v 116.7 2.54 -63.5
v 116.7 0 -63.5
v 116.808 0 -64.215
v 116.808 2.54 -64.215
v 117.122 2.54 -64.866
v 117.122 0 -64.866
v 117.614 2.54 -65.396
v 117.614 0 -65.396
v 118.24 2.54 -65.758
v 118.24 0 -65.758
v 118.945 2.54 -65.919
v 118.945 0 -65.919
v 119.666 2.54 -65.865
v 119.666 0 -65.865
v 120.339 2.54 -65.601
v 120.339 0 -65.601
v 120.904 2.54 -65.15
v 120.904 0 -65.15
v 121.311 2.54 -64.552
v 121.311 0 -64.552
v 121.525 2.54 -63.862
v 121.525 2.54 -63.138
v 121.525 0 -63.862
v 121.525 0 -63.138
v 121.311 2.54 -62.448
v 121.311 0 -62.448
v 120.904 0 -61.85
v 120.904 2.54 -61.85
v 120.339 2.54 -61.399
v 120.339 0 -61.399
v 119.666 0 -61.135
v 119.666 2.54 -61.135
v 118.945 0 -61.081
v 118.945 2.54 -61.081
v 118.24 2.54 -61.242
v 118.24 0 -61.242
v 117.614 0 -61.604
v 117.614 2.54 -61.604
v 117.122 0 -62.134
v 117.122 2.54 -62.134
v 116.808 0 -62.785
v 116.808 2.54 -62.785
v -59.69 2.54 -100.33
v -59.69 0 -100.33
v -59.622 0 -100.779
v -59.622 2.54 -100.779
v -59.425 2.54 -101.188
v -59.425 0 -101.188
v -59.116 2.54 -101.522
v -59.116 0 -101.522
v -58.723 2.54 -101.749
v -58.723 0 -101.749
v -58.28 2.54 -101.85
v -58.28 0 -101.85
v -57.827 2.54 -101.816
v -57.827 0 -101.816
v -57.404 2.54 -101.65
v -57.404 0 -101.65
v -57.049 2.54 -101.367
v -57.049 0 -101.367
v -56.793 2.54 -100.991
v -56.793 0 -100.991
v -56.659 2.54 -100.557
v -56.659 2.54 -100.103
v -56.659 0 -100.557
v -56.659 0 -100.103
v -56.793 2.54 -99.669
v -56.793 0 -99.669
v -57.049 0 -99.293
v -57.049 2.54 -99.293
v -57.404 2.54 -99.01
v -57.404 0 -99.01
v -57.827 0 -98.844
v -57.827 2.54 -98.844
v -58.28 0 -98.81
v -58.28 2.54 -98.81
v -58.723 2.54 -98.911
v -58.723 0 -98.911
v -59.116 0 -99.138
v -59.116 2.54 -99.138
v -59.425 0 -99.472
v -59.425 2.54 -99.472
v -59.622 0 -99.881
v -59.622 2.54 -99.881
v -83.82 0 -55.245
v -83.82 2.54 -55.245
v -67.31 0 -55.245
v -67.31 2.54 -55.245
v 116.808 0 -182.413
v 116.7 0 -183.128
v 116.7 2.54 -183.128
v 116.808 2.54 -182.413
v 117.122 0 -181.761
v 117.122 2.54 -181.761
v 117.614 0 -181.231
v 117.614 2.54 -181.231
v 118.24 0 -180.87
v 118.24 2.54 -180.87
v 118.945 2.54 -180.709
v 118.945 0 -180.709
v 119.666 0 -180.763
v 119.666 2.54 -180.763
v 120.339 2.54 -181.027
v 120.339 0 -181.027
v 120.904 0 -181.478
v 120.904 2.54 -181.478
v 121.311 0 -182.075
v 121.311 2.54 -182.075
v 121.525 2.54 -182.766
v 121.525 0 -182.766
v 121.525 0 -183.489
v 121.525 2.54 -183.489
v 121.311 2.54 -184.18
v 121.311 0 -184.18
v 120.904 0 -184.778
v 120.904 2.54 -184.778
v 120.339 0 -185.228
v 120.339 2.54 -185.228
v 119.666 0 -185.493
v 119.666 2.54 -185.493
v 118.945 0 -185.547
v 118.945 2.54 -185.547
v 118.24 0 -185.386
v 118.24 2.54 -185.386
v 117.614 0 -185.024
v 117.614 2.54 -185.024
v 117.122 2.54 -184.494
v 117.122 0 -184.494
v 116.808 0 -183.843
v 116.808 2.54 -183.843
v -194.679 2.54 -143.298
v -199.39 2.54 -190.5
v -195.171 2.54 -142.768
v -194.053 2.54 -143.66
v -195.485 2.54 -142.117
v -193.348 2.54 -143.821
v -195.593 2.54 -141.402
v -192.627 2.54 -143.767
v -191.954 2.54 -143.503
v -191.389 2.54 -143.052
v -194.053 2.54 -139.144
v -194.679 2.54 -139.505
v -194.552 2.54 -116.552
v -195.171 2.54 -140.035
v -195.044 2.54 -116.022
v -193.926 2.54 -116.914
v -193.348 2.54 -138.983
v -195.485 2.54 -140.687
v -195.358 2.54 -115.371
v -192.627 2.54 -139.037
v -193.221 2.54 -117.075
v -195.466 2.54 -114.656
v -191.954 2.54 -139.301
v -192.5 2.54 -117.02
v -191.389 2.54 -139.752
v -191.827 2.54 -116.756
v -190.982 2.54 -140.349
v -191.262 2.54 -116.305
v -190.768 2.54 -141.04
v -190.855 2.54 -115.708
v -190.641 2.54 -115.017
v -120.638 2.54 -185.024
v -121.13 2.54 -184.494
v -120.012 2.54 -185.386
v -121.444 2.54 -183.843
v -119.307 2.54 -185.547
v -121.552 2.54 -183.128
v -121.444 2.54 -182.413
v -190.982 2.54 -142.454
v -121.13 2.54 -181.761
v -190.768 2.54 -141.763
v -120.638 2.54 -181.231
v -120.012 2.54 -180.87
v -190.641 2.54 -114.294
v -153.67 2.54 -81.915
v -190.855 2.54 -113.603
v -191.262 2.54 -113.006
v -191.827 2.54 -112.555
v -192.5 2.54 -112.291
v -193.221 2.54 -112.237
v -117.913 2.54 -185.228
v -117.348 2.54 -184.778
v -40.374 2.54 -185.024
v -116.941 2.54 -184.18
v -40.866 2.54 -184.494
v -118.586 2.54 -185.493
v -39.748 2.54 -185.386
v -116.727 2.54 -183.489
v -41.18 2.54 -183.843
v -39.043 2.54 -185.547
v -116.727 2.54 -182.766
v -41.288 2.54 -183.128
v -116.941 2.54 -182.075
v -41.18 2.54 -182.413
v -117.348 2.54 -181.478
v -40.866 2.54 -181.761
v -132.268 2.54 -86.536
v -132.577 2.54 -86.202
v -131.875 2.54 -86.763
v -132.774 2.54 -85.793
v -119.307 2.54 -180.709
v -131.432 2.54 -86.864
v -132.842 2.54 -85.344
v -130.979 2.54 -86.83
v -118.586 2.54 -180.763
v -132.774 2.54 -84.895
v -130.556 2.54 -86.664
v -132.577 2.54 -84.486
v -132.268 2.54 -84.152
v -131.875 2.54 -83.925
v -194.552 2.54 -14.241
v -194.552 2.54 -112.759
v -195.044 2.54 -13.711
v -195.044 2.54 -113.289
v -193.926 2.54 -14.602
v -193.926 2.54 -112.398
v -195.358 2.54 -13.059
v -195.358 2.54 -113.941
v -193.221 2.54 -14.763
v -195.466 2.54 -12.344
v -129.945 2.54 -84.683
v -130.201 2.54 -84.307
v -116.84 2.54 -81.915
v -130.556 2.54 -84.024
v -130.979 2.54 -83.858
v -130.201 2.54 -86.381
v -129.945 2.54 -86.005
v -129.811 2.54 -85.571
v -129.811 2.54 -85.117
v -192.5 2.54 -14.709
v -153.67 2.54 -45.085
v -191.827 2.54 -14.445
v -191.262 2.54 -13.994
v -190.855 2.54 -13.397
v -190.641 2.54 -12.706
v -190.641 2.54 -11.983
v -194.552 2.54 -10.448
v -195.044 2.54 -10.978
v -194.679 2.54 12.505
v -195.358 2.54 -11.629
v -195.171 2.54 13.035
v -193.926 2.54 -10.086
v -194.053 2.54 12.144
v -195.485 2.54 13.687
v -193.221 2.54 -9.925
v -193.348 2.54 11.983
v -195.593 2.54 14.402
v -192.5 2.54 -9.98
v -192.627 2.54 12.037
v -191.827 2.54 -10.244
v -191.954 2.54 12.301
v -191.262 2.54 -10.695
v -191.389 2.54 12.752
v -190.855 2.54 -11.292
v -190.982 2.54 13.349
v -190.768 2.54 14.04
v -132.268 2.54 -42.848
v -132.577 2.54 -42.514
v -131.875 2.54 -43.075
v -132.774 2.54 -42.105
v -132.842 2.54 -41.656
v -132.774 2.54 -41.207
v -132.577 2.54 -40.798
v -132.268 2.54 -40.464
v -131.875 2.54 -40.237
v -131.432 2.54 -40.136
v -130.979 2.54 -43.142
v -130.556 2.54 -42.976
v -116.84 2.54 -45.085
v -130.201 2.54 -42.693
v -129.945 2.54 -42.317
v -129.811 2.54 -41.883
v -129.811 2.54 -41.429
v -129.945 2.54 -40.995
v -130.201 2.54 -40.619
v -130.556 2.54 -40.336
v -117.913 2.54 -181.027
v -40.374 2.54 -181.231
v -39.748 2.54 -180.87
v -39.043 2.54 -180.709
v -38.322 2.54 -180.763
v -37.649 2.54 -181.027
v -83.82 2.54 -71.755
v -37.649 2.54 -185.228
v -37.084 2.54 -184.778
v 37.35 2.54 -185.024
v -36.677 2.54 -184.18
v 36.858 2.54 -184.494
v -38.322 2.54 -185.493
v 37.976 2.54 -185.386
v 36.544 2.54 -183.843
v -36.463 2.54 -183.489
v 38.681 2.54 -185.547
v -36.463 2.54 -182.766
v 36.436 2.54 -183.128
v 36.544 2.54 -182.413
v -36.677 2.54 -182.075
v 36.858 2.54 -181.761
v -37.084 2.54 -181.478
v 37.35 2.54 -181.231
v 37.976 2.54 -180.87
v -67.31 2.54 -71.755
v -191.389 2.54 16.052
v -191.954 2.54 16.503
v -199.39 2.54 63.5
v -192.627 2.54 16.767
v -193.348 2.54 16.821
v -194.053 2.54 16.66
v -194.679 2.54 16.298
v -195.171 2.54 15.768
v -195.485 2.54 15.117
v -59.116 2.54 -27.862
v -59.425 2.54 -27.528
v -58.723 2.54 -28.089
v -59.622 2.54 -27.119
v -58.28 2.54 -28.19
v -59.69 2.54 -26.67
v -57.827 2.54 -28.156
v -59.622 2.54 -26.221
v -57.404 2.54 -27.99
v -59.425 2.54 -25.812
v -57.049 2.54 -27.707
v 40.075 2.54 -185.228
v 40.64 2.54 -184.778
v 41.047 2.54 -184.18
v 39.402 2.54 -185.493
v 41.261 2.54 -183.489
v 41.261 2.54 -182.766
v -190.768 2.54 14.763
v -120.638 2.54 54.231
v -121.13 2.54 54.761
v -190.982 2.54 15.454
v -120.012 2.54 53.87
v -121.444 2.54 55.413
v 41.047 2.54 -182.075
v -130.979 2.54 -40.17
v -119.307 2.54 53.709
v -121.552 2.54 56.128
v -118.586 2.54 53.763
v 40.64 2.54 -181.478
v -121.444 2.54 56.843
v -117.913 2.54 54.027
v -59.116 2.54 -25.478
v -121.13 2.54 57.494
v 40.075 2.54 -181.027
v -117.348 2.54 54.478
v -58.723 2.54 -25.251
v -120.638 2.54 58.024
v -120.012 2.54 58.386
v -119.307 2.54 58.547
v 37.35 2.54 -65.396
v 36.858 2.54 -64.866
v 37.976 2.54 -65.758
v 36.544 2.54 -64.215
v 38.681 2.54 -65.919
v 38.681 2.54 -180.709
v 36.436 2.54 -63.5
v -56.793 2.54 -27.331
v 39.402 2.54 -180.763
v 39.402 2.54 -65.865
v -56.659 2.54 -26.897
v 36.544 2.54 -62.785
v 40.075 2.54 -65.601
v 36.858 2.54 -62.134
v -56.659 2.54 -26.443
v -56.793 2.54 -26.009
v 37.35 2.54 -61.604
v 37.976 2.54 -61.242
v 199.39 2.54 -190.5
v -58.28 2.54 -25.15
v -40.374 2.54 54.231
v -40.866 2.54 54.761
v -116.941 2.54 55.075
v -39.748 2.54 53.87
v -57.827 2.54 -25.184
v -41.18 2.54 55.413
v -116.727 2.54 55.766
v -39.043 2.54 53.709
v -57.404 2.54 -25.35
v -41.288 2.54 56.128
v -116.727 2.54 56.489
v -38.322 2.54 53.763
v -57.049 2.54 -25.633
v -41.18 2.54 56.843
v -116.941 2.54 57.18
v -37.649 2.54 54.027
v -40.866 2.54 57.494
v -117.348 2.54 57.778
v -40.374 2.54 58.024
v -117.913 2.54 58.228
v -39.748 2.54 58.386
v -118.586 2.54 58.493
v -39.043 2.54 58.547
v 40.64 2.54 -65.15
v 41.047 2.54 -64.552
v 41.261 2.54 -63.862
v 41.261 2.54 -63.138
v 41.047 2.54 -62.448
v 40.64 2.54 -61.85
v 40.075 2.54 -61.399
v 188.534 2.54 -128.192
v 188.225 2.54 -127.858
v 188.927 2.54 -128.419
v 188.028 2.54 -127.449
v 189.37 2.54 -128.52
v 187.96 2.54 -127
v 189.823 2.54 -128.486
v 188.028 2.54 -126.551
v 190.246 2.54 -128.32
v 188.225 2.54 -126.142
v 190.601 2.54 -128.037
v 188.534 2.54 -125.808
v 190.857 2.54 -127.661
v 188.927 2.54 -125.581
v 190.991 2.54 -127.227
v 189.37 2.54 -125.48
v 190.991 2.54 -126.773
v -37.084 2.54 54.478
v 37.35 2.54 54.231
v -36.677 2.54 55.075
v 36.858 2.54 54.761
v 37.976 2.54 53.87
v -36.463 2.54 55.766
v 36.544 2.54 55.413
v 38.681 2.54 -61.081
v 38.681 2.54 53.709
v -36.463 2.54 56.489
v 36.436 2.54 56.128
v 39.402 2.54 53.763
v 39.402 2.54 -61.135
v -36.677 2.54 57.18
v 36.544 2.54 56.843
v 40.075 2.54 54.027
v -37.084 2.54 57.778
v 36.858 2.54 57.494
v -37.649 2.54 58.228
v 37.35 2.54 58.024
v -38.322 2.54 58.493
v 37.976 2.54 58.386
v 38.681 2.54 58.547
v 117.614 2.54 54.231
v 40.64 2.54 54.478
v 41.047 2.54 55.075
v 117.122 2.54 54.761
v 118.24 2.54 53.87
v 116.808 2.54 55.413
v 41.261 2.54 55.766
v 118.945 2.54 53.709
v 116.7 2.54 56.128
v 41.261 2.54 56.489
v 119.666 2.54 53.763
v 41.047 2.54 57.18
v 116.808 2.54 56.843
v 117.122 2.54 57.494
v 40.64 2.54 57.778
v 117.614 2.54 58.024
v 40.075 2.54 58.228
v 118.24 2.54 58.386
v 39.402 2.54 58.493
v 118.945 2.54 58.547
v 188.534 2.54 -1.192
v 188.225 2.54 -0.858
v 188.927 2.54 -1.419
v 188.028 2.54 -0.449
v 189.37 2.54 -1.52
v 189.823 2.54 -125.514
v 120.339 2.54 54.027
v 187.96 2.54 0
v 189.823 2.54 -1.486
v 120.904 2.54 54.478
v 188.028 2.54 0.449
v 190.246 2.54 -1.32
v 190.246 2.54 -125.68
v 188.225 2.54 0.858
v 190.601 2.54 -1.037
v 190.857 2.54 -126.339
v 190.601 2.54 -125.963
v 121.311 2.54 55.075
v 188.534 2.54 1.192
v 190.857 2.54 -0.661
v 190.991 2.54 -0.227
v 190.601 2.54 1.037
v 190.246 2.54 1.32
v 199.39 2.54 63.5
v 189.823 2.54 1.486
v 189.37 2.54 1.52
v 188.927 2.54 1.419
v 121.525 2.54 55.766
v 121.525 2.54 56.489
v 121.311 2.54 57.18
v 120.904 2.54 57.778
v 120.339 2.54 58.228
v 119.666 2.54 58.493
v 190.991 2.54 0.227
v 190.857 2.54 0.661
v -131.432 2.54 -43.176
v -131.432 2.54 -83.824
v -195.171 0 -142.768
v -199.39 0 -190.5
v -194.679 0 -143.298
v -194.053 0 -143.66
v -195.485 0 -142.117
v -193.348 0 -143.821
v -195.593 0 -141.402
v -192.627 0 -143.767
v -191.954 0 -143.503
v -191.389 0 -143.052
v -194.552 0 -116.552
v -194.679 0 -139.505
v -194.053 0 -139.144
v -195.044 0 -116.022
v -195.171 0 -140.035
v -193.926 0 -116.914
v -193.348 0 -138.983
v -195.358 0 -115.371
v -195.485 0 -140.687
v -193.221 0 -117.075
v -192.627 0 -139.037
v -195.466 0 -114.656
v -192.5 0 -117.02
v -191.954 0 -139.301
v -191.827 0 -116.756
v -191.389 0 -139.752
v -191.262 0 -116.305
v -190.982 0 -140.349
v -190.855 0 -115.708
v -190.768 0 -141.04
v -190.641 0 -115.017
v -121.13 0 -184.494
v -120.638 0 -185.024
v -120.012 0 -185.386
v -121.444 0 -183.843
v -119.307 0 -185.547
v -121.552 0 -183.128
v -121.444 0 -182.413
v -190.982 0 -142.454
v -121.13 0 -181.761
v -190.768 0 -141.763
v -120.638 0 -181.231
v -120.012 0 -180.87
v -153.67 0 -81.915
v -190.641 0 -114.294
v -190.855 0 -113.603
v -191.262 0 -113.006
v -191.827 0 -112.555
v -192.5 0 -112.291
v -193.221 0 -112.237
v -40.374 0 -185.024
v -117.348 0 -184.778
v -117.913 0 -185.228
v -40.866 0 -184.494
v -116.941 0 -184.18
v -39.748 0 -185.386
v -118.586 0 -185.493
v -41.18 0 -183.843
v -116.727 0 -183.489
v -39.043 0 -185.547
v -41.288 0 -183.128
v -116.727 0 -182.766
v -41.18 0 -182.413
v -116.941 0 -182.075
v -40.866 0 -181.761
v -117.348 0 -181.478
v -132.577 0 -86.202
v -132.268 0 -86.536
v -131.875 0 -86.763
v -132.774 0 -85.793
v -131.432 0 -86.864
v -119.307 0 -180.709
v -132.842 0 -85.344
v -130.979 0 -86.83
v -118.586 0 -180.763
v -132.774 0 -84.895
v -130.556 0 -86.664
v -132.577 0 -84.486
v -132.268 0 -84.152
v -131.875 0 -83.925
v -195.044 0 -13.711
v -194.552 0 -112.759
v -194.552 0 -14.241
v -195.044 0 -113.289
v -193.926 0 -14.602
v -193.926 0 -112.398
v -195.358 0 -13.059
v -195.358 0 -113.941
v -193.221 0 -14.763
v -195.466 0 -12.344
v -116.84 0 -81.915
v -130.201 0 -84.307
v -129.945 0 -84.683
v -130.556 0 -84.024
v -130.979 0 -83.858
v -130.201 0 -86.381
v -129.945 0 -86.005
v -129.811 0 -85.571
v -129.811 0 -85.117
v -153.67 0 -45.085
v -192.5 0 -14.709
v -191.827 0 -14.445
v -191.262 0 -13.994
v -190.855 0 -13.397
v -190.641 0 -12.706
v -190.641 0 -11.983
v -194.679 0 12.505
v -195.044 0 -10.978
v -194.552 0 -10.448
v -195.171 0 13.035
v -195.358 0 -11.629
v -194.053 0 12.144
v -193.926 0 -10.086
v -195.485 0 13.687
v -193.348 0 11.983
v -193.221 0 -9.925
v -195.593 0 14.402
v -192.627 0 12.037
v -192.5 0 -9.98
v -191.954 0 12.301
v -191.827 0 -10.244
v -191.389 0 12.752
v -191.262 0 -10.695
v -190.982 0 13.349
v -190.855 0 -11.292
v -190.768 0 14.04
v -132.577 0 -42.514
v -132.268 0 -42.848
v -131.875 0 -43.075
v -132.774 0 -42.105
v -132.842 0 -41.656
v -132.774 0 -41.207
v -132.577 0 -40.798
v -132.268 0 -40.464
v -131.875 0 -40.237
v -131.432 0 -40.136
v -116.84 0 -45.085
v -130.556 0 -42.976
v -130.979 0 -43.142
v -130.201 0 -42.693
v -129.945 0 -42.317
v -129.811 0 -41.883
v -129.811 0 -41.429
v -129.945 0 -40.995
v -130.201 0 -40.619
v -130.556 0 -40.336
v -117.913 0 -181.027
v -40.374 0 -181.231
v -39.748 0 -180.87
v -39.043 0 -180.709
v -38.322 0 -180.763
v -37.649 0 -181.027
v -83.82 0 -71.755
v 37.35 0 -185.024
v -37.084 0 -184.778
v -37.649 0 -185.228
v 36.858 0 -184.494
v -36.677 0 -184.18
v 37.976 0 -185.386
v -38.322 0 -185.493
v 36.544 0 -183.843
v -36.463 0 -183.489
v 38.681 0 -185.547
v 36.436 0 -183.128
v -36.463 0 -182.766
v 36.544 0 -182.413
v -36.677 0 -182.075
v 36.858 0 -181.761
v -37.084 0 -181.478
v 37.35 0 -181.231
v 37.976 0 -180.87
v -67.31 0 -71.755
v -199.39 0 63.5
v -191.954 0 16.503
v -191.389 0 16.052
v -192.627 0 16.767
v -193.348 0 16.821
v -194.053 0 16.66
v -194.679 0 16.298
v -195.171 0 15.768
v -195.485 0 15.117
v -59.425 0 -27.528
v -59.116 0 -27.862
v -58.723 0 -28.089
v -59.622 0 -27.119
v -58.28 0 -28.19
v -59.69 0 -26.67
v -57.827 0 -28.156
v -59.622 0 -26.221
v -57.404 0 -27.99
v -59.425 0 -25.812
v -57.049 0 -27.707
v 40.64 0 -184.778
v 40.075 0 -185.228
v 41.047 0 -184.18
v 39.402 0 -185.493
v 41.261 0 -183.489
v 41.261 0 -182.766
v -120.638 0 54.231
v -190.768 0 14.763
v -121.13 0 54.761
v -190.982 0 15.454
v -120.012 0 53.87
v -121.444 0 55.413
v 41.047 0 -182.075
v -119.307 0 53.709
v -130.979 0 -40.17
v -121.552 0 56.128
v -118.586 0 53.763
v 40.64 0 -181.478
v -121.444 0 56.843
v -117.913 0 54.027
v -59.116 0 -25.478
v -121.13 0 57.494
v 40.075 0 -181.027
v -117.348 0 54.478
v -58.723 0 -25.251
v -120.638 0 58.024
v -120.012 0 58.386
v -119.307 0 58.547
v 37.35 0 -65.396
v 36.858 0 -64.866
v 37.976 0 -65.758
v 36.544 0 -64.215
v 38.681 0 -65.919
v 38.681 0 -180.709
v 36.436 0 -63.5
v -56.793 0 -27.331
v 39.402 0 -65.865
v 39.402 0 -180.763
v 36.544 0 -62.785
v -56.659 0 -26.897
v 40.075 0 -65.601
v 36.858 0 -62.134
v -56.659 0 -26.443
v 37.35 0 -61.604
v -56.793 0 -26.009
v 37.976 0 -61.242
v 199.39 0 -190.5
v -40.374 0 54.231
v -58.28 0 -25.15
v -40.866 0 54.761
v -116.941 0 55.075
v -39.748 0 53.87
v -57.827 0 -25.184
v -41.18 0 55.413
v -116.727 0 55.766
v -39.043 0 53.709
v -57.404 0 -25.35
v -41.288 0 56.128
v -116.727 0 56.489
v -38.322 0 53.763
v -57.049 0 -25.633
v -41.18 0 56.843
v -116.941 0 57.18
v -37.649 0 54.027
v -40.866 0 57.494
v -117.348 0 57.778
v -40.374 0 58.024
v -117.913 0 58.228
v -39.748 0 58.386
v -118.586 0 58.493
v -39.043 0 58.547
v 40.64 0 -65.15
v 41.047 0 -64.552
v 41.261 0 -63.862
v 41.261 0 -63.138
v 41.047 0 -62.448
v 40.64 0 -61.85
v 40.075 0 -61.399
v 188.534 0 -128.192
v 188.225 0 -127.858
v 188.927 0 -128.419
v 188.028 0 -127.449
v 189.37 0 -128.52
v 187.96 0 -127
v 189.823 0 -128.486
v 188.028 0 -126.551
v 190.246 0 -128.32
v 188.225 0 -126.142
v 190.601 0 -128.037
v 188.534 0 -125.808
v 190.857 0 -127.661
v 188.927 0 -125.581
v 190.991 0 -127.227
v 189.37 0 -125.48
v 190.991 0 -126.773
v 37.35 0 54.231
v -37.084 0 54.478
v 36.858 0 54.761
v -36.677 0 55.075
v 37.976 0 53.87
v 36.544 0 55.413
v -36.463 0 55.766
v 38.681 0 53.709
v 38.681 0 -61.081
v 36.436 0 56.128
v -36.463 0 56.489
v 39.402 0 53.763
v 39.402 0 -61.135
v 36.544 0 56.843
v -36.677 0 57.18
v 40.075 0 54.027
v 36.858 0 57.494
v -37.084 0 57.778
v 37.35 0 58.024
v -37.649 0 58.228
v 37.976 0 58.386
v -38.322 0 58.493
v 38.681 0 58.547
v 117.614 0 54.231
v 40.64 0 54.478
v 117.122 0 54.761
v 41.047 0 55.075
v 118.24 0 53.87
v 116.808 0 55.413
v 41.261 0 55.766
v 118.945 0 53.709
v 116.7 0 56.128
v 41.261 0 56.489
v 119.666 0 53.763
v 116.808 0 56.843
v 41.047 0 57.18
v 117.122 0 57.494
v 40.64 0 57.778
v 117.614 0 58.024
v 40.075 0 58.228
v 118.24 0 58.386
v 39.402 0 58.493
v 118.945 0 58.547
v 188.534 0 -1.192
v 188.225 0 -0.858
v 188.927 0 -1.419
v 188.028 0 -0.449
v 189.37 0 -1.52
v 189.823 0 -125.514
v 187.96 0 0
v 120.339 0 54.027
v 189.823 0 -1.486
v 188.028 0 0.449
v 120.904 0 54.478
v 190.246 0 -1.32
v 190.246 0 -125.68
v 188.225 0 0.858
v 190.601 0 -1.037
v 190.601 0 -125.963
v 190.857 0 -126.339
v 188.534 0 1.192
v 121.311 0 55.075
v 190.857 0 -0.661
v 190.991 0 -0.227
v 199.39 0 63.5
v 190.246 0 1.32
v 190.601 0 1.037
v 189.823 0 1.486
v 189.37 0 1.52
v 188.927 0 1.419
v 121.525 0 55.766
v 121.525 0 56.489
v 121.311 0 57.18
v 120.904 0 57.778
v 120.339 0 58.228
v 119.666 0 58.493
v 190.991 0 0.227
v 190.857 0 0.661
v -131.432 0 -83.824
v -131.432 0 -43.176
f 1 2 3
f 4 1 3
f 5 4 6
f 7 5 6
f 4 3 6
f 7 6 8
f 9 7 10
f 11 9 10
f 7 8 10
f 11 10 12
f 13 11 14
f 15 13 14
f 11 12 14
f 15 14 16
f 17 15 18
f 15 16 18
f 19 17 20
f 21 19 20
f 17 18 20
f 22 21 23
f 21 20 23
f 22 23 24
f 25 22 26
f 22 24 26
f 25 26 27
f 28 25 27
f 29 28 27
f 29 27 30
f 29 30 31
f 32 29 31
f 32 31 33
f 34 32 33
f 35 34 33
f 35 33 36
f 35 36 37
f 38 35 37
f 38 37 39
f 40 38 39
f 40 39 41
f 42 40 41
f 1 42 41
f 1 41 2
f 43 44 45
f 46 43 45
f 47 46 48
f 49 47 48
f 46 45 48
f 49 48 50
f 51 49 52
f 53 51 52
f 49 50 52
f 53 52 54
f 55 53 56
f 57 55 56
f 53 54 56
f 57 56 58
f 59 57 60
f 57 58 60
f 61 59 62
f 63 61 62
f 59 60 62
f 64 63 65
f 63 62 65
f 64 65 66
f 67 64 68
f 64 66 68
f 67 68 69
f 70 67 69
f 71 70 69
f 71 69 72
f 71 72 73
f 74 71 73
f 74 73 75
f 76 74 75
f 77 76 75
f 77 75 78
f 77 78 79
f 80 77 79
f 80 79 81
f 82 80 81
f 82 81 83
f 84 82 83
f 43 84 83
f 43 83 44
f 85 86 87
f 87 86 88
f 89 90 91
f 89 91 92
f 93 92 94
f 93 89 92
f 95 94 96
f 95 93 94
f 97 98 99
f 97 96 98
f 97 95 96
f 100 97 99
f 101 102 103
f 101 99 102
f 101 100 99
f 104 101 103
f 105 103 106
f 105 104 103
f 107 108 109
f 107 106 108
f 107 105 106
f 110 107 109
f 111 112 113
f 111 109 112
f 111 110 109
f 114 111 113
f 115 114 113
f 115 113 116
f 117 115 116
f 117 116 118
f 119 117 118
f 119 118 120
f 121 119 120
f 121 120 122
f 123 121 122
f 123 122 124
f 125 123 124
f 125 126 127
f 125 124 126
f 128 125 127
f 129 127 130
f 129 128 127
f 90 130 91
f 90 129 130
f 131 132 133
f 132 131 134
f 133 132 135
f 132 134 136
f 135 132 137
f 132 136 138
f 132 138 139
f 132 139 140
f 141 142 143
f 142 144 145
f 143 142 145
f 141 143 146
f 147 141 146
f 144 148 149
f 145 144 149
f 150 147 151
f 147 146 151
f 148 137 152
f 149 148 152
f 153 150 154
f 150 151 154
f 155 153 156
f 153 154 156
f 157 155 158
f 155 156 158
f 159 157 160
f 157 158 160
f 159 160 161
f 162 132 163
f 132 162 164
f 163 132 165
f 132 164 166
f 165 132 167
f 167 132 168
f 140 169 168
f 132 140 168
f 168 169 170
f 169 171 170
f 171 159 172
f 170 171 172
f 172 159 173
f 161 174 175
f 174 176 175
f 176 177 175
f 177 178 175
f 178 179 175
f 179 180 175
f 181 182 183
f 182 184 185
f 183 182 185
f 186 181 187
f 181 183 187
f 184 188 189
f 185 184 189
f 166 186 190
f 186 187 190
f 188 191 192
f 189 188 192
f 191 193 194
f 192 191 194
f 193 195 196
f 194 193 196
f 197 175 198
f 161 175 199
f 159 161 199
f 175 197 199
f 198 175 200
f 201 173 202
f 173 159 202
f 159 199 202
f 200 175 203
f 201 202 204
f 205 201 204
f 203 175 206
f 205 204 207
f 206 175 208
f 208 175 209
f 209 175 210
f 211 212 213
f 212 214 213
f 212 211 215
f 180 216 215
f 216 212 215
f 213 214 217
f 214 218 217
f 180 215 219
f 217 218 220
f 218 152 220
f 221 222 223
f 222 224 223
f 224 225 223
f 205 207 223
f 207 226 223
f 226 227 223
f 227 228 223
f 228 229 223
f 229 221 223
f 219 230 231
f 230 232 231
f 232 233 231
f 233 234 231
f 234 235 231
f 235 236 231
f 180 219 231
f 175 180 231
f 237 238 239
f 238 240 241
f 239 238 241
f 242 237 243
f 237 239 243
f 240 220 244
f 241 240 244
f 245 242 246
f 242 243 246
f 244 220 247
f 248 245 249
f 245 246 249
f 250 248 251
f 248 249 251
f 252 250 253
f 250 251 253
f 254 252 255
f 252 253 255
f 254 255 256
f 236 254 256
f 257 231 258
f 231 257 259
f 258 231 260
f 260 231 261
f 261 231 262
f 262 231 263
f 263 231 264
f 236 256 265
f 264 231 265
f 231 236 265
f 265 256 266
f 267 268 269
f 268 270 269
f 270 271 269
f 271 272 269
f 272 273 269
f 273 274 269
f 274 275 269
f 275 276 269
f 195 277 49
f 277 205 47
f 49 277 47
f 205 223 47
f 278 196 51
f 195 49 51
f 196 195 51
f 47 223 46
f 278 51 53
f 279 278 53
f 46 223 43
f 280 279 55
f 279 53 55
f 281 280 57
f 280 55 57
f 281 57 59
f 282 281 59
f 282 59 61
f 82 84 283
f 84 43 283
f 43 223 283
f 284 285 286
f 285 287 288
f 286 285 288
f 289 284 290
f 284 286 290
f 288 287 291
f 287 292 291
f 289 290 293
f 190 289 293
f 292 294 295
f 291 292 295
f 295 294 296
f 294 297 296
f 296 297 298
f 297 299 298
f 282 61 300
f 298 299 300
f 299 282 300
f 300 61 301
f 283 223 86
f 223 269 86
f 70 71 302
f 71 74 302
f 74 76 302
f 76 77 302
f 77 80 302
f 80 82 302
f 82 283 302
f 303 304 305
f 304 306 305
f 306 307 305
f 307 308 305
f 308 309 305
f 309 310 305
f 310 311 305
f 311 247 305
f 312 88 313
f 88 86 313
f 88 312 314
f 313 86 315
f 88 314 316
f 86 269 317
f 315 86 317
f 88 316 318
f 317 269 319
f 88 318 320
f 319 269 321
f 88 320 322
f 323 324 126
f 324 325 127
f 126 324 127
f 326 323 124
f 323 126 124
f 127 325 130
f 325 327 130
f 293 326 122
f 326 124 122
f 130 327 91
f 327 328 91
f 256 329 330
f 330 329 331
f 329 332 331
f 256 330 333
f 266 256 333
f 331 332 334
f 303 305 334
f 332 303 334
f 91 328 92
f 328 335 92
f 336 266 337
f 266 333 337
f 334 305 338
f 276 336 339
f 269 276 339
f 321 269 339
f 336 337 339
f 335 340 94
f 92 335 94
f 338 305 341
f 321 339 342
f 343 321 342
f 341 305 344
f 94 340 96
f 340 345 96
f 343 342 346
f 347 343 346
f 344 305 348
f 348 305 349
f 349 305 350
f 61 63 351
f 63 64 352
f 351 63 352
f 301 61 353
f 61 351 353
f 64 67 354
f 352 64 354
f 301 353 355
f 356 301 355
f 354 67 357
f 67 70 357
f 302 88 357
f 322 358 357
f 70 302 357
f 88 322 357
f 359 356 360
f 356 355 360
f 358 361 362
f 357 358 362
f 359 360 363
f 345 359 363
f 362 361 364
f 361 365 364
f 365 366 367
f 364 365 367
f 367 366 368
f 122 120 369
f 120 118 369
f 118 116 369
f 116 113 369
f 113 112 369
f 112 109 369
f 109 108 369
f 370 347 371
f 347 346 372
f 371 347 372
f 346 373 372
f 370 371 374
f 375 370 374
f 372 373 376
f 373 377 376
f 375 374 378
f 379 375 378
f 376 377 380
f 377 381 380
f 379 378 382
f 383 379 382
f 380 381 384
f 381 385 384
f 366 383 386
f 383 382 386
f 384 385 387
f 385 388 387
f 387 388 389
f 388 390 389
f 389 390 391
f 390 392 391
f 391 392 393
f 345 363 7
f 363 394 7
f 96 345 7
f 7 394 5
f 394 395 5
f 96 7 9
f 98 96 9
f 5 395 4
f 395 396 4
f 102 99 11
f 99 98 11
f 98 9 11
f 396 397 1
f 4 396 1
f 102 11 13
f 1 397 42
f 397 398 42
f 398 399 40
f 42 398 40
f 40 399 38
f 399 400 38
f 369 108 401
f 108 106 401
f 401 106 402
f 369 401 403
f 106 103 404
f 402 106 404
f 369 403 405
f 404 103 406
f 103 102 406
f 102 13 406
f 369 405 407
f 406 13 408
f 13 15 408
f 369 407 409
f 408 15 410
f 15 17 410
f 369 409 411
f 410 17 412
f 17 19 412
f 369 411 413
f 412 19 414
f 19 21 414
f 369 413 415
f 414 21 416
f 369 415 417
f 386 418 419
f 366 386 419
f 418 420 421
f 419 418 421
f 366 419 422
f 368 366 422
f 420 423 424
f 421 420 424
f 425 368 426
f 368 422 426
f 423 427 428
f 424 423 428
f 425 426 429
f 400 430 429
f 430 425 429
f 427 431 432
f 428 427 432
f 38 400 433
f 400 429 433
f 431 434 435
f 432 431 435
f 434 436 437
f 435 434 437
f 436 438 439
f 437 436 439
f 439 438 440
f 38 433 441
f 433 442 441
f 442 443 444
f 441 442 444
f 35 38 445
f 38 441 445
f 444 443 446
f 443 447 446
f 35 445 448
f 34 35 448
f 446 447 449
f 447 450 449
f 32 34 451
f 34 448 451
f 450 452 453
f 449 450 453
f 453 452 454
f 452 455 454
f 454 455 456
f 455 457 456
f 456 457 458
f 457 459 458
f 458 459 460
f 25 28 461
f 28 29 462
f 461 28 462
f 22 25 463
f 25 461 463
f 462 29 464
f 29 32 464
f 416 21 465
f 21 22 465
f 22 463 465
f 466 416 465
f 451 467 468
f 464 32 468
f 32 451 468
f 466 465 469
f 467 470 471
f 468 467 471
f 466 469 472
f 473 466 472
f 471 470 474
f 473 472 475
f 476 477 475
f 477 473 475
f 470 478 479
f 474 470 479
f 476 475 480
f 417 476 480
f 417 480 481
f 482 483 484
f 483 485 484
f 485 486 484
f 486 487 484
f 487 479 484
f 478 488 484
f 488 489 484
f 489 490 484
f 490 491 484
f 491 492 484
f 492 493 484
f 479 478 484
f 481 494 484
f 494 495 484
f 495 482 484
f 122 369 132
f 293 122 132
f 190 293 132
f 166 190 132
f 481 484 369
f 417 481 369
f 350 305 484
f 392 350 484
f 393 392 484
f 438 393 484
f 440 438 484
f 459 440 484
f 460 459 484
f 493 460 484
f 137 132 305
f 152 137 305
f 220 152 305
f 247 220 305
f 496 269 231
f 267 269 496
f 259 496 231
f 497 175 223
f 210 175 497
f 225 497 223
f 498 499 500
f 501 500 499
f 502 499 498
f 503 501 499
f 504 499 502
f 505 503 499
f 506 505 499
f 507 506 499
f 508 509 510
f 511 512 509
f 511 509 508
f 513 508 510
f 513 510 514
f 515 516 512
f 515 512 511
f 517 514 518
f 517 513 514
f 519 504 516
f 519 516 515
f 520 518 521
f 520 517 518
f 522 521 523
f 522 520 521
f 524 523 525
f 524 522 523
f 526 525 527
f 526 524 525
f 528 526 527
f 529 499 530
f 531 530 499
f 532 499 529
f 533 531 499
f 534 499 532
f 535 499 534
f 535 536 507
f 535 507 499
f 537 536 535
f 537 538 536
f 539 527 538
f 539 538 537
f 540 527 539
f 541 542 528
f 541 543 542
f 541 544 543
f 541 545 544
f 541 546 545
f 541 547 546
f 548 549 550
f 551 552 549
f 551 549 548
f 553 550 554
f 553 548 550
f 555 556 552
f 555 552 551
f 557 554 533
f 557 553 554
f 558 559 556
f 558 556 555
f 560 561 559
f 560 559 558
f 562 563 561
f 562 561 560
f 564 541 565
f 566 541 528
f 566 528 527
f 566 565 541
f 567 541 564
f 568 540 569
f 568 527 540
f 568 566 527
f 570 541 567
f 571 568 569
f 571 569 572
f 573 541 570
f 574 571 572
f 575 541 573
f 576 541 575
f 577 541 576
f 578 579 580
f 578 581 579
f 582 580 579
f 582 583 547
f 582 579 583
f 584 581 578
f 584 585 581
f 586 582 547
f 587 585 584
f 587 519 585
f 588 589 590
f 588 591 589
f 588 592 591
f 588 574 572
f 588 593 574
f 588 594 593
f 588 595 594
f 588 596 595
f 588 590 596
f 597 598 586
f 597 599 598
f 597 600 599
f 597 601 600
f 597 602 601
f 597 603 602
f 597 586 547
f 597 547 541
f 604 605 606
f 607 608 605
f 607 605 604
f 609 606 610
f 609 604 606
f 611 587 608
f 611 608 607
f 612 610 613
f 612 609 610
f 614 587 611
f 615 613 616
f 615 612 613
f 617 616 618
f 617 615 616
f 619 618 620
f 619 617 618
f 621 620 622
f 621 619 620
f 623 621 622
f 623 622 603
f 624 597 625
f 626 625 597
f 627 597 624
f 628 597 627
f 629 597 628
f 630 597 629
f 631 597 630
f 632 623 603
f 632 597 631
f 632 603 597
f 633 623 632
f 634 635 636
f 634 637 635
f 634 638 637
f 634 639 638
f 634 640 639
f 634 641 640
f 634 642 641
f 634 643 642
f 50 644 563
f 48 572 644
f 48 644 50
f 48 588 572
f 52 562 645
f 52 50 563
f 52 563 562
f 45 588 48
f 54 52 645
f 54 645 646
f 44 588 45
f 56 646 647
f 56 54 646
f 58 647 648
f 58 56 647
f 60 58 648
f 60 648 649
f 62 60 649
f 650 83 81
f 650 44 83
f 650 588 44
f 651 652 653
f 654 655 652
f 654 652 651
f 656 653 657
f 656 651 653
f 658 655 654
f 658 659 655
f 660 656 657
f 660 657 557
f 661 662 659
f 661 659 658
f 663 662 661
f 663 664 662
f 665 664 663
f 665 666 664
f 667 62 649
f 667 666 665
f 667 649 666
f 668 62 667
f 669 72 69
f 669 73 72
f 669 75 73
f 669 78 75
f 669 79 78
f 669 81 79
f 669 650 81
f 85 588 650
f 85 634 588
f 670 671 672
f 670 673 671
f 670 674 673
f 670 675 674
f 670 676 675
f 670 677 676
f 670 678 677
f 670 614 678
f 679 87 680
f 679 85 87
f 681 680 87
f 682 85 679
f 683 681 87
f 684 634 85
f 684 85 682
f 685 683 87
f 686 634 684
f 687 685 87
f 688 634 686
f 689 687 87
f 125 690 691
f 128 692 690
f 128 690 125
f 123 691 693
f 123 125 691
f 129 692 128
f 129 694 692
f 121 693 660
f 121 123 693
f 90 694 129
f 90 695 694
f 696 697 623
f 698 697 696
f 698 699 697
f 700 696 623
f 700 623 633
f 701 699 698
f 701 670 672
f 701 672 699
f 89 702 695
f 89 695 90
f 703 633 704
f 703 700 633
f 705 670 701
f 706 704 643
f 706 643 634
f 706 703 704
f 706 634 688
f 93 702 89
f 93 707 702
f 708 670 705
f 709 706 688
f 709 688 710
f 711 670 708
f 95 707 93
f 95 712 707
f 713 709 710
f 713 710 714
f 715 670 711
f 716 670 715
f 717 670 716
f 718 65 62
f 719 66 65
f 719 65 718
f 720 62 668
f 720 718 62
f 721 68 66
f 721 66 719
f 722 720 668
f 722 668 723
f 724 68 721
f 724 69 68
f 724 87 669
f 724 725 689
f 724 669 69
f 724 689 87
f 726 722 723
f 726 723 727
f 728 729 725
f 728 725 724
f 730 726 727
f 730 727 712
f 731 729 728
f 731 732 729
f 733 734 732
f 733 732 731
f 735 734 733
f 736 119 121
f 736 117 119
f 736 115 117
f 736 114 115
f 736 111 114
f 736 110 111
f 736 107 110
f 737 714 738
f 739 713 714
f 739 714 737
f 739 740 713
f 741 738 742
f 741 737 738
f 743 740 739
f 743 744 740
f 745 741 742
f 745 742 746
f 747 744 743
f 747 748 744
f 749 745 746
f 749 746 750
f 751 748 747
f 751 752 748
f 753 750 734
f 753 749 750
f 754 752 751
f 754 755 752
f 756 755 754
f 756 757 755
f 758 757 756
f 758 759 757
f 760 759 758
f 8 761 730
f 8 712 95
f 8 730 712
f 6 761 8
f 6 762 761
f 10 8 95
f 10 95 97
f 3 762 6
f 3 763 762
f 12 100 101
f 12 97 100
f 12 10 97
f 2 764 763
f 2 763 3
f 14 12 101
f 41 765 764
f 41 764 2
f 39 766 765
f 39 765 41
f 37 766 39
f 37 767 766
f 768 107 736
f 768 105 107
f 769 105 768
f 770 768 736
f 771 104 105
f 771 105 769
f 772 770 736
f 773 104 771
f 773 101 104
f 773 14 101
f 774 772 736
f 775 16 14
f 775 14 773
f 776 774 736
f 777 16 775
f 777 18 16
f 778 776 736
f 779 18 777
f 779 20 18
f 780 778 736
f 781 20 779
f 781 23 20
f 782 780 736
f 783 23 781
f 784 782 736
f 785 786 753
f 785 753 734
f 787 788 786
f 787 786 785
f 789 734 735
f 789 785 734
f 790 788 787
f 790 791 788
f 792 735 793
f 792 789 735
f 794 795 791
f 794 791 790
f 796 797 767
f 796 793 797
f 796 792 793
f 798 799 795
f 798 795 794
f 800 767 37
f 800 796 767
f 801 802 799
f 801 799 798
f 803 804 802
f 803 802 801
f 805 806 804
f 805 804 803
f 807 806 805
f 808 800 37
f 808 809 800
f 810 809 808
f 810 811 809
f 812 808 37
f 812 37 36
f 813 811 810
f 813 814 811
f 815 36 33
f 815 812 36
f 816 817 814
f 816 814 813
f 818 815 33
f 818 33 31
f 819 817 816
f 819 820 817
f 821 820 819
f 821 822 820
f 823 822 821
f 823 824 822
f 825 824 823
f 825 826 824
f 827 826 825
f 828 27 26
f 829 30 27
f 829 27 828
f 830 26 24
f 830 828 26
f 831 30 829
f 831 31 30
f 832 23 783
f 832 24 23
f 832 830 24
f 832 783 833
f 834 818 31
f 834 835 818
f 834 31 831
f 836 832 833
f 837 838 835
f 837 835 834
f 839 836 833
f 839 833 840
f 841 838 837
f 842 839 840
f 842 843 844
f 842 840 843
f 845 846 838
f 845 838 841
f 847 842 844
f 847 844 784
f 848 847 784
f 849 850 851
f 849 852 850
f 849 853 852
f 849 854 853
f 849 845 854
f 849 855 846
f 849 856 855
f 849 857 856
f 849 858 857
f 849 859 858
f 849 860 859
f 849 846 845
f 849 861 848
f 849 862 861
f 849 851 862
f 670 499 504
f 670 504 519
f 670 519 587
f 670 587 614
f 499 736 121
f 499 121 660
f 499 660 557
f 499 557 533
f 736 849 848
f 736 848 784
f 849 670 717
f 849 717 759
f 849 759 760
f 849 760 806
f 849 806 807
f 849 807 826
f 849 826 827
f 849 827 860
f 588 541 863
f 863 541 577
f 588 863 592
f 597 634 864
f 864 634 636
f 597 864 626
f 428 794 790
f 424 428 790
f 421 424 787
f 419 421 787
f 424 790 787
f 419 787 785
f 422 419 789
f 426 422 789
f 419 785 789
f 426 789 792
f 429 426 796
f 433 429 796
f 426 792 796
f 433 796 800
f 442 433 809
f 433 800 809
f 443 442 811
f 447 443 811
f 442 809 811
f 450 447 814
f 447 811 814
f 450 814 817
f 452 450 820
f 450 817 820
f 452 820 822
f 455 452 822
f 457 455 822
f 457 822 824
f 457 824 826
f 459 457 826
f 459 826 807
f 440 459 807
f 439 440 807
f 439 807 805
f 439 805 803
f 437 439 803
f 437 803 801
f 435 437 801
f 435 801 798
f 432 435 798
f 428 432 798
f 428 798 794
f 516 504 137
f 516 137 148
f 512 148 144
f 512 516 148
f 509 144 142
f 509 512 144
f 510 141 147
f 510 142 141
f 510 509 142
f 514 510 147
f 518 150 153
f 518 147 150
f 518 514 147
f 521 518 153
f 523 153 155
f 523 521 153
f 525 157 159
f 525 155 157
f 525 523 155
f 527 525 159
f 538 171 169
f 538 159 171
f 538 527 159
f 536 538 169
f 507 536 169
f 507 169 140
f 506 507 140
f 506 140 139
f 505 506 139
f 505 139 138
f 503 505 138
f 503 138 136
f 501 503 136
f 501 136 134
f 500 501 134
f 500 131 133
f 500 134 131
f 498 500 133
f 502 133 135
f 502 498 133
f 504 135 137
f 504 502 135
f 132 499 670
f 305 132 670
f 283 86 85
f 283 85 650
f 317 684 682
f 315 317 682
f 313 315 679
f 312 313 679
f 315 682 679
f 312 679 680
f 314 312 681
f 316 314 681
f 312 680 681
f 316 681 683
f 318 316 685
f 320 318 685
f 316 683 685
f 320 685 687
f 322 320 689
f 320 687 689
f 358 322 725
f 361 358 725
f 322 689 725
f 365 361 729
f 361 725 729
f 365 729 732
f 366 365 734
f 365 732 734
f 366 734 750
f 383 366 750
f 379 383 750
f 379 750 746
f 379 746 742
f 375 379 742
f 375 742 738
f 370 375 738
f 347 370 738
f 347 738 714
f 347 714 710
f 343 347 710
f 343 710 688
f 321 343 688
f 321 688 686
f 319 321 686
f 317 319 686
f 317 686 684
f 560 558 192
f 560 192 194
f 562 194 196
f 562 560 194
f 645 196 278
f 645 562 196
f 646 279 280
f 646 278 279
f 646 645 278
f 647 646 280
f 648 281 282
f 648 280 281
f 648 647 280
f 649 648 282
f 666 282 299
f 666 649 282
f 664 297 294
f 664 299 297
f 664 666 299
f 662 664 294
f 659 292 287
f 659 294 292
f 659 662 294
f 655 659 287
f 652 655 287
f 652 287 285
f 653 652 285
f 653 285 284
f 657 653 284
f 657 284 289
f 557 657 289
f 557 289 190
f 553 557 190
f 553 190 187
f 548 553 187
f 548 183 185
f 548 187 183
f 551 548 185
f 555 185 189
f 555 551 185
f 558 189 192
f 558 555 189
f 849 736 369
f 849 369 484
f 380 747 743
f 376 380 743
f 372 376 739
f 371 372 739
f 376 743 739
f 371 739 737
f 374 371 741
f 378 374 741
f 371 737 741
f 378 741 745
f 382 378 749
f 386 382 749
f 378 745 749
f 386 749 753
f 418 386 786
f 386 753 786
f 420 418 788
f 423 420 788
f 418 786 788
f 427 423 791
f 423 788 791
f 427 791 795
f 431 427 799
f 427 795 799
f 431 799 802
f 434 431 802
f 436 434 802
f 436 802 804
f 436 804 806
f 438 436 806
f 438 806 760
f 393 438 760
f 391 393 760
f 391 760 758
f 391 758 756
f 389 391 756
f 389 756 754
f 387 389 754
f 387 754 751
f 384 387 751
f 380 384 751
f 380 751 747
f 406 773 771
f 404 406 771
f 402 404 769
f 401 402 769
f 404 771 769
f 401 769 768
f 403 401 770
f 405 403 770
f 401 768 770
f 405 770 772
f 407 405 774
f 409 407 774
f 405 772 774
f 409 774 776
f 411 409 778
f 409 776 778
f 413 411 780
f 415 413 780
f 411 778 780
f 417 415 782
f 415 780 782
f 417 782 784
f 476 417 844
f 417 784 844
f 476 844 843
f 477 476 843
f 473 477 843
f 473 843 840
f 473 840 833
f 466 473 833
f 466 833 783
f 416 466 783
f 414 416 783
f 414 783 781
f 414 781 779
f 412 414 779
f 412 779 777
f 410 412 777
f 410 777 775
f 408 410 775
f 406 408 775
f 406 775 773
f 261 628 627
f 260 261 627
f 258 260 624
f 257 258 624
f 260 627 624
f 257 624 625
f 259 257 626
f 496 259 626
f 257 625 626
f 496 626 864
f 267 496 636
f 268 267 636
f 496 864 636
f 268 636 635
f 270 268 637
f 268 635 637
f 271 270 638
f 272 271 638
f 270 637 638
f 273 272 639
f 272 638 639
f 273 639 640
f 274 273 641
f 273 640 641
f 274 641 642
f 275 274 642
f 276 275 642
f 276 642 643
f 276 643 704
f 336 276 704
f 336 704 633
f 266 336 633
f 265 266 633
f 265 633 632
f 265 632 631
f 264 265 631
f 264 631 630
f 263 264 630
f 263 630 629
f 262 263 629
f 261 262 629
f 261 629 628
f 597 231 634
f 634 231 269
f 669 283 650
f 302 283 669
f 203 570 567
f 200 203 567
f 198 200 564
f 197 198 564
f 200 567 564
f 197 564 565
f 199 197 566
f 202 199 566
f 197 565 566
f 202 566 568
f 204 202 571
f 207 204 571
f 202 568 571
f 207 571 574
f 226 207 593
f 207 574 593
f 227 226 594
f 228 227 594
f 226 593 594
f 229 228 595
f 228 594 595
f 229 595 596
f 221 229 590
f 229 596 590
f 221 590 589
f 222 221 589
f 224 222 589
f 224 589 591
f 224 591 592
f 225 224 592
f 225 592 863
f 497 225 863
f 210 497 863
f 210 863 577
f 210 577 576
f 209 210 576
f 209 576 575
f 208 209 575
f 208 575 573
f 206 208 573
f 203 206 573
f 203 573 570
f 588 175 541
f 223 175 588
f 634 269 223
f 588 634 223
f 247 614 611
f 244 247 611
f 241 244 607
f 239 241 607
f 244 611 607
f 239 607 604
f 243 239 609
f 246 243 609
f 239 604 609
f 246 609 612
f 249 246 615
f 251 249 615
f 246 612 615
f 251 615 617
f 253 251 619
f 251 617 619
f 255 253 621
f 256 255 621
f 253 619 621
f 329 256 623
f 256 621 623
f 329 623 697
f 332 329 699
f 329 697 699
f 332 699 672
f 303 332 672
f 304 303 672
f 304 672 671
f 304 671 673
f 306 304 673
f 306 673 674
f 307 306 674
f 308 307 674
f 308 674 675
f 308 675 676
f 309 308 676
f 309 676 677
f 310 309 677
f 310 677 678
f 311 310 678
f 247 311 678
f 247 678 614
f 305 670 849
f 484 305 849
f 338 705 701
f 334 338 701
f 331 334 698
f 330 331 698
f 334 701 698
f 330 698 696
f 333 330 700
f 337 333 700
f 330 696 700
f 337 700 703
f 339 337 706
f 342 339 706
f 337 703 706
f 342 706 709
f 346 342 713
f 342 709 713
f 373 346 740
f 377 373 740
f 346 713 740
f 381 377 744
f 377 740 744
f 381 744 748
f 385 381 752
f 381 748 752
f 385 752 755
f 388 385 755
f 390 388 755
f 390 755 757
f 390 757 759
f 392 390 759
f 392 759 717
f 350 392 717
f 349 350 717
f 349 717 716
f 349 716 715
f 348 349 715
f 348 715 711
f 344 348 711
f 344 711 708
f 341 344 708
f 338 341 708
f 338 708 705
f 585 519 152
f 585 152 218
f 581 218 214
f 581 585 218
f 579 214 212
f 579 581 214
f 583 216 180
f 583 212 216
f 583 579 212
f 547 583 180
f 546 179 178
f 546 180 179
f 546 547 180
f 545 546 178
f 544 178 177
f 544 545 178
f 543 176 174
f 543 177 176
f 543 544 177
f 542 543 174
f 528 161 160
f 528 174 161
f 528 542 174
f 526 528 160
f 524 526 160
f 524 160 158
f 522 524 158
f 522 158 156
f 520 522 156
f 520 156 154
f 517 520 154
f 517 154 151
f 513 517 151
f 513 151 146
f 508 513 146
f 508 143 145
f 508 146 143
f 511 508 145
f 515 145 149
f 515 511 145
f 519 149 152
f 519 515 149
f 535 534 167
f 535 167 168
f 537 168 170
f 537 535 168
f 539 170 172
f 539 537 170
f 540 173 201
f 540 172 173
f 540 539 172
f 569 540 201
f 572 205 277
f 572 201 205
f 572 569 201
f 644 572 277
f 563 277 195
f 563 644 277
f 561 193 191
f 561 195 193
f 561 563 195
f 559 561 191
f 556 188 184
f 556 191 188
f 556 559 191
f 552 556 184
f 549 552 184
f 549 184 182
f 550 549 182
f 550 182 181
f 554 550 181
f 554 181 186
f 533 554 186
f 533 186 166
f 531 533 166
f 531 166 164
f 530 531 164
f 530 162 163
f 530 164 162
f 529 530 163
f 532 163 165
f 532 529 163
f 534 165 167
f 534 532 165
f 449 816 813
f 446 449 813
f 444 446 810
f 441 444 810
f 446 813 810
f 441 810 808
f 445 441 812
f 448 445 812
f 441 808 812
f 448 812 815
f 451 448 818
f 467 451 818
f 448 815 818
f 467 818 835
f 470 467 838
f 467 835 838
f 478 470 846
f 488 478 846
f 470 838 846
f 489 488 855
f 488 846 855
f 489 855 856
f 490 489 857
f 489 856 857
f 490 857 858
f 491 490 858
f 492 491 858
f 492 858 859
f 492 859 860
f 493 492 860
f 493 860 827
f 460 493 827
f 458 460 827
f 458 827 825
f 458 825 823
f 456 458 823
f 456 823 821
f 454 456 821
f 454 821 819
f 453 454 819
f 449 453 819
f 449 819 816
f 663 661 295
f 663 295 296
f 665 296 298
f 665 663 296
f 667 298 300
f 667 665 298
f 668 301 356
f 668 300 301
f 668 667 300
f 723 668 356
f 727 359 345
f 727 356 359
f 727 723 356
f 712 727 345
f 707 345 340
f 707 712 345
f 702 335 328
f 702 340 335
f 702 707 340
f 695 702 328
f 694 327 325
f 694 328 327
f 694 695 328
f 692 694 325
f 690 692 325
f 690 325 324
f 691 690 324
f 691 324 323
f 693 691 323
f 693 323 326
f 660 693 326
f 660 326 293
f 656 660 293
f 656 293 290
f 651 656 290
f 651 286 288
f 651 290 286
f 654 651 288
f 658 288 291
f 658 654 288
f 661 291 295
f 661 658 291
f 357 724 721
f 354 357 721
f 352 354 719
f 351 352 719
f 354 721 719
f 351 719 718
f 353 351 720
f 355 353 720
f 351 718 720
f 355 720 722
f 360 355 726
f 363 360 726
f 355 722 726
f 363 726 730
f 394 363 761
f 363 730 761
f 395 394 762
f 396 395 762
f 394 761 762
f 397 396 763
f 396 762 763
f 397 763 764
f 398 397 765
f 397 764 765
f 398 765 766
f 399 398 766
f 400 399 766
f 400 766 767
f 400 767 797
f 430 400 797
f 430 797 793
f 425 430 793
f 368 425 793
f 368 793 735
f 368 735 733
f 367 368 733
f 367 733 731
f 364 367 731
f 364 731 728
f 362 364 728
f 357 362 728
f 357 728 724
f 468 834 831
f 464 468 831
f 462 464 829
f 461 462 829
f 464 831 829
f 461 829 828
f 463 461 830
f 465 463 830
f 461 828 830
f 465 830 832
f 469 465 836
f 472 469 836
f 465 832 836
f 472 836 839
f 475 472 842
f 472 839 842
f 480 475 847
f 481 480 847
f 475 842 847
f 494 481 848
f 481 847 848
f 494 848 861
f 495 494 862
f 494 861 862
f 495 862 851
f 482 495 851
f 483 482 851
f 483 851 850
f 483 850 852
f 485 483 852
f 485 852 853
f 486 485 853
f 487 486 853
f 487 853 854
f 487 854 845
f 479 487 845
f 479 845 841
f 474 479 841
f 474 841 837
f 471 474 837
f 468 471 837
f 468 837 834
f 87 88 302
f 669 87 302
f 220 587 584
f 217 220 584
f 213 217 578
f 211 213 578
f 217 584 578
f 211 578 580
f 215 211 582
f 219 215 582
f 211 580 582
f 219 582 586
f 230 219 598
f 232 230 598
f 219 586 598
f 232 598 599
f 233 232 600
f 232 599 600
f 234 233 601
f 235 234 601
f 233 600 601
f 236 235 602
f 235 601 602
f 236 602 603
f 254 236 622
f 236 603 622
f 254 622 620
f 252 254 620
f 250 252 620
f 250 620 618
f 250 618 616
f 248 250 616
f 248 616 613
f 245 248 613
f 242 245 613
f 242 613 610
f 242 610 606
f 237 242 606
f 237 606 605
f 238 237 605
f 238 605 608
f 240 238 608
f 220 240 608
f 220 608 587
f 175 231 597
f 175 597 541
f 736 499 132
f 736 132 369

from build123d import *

# Parameters (mm, degrees)
SKETCH1_W                    = 199.39
SKETCH1_H                    = 127
BOSS_EXTRUDE1_DEPTH          = 2.54
F_11_0_191_DIAMETER_HOLE1_D  = 4.8514
F_11_0_191_DIAMETER_HOLE2_D  = 4.8514
SKETCH8_W                    = 36.83
SKETCH8_H                    = 18.415
SKETCH8_W_2                  = 16.51
SKETCH8_H_2                  = 8.255
CUT_EXTRUDE1_DEPTH           = 2.54
F_11_0_191_DIAMETER_HOLE3_D  = 4.8514
F_31_0_12_DIAMETER_HOLE2_D   = 3.048
F_31_0_12_DIAMETER_HOLE3_D   = 3.048
F_1_8_0_125_DIAMETER_HOLE1_D = 3.048


with BuildPart() as part:
    # Sketch1 → Boss-Extrude1 (new body)
    with BuildSketch(Plane(origin=(0, 0, 0), x_dir=(1, 0, 0), z_dir=(0, 1, 0))):
        with Locations((-99.695, 0)):
            Rectangle(SKETCH1_W, SKETCH1_H)
        with Locations((99.695, 0)):
            Rectangle(SKETCH1_W, SKETCH1_H)
    boss_extrude1 = extrude(amount=BOSS_EXTRUDE1_DEPTH)

    # #11 (0.191) Diameter Hole1 (through all)
    with Locations(Plane(origin=(0, 2.54, 0), x_dir=(1, 0, 0), z_dir=(0, 1, 0))):
        with Locations((-193.167, -14.4018), (-193.04, 12.3444)):
            f_11_0_191_diameter_hole1 = Hole(F_11_0_191_DIAMETER_HOLE1_D / 2)

    # #11 (0.191) Diameter Hole2 (through all)
    with Locations(Plane(origin=(0, 2.54, 0), x_dir=(1, 0, 0), z_dir=(0, 1, 0))):
        with Locations((-119.126, -56.127777467), (-38.862, -56.127777467), (38.862, -56.127777467), (119.126, -56.127777467)):
            f_11_0_191_diameter_hole2 = Hole(F_11_0_191_DIAMETER_HOLE2_D / 2)

    # Sketch8 → Cut-Extrude1 (cut)
    with BuildSketch(Plane(origin=(0, 2.54, 0), x_dir=(1, 0, 0), z_dir=(0, 1, 0))):
        with Locations((-135.255, 54.2925)):
            Rectangle(SKETCH8_W, SKETCH8_H)
        with Locations((-75.565, 59.3725)):
            Rectangle(SKETCH8_W_2, SKETCH8_H_2)
    cut_extrude1 = extrude(amount=-CUT_EXTRUDE1_DEPTH, mode=Mode.SUBTRACT)

    # Mirror6: Boss-Extrude1, #11 (0.191) Diameter Hole1, #11 (0.191) Diameter Hole2, Cut-Extrude1 across plane
    add(boss_extrude1.mirror(Plane(origin=(0, 2.54, -63.5), x_dir=(1, 0, 0), z_dir=(0, 0, -1))))
    add(f_11_0_191_diameter_hole1.mirror(Plane(origin=(0, 2.54, -63.5), x_dir=(1, 0, 0), z_dir=(0, 0, -1))), mode=Mode.SUBTRACT)
    add(f_11_0_191_diameter_hole2.mirror(Plane(origin=(0, 2.54, -63.5), x_dir=(1, 0, 0), z_dir=(0, 0, -1))), mode=Mode.SUBTRACT)
    add(cut_extrude1.mirror(Plane(origin=(0, 2.54, -63.5), x_dir=(1, 0, 0), z_dir=(0, 0, -1))), mode=Mode.SUBTRACT)

    # #11 (0.191) Diameter Hole3 (through all)
    with Locations(Plane(origin=(0, 2.54, 0), x_dir=(1, 0, 0), z_dir=(0, 1, 0))):
        with Locations((119.126, 63.5), (38.862, 63.5)):
            Hole(F_11_0_191_DIAMETER_HOLE3_D / 2)

    # #31 (0.12) Diameter Hole2 (through all)
    with Locations(Plane(origin=(0, 2.54, 0), x_dir=(1, 0, 0), z_dir=(0, 1, 0))):
        with Locations((-131.318, 41.656), (-131.318, 85.344)):
            Hole(F_31_0_12_DIAMETER_HOLE2_D / 2)

    # #31 (0.12) Diameter Hole3 (through all)
    with Locations(Plane(origin=(0, 2.54, 0), x_dir=(1, 0, 0), z_dir=(0, 1, 0))):
        with Locations((-58.166, 100.33), (-58.166, 26.67)):
            Hole(F_31_0_12_DIAMETER_HOLE3_D / 2)

    # 1/8 (0.125) Diameter Hole1 (through all)
    with Locations(Plane(origin=(0, 2.54, 0), x_dir=(1, 0, 0), z_dir=(0, 1, 0))):
        with Locations((189.484, 0), (189.484, 127)):
            Hole(F_1_8_0_125_DIAMETER_HOLE1_D / 2)


solid = part.part
